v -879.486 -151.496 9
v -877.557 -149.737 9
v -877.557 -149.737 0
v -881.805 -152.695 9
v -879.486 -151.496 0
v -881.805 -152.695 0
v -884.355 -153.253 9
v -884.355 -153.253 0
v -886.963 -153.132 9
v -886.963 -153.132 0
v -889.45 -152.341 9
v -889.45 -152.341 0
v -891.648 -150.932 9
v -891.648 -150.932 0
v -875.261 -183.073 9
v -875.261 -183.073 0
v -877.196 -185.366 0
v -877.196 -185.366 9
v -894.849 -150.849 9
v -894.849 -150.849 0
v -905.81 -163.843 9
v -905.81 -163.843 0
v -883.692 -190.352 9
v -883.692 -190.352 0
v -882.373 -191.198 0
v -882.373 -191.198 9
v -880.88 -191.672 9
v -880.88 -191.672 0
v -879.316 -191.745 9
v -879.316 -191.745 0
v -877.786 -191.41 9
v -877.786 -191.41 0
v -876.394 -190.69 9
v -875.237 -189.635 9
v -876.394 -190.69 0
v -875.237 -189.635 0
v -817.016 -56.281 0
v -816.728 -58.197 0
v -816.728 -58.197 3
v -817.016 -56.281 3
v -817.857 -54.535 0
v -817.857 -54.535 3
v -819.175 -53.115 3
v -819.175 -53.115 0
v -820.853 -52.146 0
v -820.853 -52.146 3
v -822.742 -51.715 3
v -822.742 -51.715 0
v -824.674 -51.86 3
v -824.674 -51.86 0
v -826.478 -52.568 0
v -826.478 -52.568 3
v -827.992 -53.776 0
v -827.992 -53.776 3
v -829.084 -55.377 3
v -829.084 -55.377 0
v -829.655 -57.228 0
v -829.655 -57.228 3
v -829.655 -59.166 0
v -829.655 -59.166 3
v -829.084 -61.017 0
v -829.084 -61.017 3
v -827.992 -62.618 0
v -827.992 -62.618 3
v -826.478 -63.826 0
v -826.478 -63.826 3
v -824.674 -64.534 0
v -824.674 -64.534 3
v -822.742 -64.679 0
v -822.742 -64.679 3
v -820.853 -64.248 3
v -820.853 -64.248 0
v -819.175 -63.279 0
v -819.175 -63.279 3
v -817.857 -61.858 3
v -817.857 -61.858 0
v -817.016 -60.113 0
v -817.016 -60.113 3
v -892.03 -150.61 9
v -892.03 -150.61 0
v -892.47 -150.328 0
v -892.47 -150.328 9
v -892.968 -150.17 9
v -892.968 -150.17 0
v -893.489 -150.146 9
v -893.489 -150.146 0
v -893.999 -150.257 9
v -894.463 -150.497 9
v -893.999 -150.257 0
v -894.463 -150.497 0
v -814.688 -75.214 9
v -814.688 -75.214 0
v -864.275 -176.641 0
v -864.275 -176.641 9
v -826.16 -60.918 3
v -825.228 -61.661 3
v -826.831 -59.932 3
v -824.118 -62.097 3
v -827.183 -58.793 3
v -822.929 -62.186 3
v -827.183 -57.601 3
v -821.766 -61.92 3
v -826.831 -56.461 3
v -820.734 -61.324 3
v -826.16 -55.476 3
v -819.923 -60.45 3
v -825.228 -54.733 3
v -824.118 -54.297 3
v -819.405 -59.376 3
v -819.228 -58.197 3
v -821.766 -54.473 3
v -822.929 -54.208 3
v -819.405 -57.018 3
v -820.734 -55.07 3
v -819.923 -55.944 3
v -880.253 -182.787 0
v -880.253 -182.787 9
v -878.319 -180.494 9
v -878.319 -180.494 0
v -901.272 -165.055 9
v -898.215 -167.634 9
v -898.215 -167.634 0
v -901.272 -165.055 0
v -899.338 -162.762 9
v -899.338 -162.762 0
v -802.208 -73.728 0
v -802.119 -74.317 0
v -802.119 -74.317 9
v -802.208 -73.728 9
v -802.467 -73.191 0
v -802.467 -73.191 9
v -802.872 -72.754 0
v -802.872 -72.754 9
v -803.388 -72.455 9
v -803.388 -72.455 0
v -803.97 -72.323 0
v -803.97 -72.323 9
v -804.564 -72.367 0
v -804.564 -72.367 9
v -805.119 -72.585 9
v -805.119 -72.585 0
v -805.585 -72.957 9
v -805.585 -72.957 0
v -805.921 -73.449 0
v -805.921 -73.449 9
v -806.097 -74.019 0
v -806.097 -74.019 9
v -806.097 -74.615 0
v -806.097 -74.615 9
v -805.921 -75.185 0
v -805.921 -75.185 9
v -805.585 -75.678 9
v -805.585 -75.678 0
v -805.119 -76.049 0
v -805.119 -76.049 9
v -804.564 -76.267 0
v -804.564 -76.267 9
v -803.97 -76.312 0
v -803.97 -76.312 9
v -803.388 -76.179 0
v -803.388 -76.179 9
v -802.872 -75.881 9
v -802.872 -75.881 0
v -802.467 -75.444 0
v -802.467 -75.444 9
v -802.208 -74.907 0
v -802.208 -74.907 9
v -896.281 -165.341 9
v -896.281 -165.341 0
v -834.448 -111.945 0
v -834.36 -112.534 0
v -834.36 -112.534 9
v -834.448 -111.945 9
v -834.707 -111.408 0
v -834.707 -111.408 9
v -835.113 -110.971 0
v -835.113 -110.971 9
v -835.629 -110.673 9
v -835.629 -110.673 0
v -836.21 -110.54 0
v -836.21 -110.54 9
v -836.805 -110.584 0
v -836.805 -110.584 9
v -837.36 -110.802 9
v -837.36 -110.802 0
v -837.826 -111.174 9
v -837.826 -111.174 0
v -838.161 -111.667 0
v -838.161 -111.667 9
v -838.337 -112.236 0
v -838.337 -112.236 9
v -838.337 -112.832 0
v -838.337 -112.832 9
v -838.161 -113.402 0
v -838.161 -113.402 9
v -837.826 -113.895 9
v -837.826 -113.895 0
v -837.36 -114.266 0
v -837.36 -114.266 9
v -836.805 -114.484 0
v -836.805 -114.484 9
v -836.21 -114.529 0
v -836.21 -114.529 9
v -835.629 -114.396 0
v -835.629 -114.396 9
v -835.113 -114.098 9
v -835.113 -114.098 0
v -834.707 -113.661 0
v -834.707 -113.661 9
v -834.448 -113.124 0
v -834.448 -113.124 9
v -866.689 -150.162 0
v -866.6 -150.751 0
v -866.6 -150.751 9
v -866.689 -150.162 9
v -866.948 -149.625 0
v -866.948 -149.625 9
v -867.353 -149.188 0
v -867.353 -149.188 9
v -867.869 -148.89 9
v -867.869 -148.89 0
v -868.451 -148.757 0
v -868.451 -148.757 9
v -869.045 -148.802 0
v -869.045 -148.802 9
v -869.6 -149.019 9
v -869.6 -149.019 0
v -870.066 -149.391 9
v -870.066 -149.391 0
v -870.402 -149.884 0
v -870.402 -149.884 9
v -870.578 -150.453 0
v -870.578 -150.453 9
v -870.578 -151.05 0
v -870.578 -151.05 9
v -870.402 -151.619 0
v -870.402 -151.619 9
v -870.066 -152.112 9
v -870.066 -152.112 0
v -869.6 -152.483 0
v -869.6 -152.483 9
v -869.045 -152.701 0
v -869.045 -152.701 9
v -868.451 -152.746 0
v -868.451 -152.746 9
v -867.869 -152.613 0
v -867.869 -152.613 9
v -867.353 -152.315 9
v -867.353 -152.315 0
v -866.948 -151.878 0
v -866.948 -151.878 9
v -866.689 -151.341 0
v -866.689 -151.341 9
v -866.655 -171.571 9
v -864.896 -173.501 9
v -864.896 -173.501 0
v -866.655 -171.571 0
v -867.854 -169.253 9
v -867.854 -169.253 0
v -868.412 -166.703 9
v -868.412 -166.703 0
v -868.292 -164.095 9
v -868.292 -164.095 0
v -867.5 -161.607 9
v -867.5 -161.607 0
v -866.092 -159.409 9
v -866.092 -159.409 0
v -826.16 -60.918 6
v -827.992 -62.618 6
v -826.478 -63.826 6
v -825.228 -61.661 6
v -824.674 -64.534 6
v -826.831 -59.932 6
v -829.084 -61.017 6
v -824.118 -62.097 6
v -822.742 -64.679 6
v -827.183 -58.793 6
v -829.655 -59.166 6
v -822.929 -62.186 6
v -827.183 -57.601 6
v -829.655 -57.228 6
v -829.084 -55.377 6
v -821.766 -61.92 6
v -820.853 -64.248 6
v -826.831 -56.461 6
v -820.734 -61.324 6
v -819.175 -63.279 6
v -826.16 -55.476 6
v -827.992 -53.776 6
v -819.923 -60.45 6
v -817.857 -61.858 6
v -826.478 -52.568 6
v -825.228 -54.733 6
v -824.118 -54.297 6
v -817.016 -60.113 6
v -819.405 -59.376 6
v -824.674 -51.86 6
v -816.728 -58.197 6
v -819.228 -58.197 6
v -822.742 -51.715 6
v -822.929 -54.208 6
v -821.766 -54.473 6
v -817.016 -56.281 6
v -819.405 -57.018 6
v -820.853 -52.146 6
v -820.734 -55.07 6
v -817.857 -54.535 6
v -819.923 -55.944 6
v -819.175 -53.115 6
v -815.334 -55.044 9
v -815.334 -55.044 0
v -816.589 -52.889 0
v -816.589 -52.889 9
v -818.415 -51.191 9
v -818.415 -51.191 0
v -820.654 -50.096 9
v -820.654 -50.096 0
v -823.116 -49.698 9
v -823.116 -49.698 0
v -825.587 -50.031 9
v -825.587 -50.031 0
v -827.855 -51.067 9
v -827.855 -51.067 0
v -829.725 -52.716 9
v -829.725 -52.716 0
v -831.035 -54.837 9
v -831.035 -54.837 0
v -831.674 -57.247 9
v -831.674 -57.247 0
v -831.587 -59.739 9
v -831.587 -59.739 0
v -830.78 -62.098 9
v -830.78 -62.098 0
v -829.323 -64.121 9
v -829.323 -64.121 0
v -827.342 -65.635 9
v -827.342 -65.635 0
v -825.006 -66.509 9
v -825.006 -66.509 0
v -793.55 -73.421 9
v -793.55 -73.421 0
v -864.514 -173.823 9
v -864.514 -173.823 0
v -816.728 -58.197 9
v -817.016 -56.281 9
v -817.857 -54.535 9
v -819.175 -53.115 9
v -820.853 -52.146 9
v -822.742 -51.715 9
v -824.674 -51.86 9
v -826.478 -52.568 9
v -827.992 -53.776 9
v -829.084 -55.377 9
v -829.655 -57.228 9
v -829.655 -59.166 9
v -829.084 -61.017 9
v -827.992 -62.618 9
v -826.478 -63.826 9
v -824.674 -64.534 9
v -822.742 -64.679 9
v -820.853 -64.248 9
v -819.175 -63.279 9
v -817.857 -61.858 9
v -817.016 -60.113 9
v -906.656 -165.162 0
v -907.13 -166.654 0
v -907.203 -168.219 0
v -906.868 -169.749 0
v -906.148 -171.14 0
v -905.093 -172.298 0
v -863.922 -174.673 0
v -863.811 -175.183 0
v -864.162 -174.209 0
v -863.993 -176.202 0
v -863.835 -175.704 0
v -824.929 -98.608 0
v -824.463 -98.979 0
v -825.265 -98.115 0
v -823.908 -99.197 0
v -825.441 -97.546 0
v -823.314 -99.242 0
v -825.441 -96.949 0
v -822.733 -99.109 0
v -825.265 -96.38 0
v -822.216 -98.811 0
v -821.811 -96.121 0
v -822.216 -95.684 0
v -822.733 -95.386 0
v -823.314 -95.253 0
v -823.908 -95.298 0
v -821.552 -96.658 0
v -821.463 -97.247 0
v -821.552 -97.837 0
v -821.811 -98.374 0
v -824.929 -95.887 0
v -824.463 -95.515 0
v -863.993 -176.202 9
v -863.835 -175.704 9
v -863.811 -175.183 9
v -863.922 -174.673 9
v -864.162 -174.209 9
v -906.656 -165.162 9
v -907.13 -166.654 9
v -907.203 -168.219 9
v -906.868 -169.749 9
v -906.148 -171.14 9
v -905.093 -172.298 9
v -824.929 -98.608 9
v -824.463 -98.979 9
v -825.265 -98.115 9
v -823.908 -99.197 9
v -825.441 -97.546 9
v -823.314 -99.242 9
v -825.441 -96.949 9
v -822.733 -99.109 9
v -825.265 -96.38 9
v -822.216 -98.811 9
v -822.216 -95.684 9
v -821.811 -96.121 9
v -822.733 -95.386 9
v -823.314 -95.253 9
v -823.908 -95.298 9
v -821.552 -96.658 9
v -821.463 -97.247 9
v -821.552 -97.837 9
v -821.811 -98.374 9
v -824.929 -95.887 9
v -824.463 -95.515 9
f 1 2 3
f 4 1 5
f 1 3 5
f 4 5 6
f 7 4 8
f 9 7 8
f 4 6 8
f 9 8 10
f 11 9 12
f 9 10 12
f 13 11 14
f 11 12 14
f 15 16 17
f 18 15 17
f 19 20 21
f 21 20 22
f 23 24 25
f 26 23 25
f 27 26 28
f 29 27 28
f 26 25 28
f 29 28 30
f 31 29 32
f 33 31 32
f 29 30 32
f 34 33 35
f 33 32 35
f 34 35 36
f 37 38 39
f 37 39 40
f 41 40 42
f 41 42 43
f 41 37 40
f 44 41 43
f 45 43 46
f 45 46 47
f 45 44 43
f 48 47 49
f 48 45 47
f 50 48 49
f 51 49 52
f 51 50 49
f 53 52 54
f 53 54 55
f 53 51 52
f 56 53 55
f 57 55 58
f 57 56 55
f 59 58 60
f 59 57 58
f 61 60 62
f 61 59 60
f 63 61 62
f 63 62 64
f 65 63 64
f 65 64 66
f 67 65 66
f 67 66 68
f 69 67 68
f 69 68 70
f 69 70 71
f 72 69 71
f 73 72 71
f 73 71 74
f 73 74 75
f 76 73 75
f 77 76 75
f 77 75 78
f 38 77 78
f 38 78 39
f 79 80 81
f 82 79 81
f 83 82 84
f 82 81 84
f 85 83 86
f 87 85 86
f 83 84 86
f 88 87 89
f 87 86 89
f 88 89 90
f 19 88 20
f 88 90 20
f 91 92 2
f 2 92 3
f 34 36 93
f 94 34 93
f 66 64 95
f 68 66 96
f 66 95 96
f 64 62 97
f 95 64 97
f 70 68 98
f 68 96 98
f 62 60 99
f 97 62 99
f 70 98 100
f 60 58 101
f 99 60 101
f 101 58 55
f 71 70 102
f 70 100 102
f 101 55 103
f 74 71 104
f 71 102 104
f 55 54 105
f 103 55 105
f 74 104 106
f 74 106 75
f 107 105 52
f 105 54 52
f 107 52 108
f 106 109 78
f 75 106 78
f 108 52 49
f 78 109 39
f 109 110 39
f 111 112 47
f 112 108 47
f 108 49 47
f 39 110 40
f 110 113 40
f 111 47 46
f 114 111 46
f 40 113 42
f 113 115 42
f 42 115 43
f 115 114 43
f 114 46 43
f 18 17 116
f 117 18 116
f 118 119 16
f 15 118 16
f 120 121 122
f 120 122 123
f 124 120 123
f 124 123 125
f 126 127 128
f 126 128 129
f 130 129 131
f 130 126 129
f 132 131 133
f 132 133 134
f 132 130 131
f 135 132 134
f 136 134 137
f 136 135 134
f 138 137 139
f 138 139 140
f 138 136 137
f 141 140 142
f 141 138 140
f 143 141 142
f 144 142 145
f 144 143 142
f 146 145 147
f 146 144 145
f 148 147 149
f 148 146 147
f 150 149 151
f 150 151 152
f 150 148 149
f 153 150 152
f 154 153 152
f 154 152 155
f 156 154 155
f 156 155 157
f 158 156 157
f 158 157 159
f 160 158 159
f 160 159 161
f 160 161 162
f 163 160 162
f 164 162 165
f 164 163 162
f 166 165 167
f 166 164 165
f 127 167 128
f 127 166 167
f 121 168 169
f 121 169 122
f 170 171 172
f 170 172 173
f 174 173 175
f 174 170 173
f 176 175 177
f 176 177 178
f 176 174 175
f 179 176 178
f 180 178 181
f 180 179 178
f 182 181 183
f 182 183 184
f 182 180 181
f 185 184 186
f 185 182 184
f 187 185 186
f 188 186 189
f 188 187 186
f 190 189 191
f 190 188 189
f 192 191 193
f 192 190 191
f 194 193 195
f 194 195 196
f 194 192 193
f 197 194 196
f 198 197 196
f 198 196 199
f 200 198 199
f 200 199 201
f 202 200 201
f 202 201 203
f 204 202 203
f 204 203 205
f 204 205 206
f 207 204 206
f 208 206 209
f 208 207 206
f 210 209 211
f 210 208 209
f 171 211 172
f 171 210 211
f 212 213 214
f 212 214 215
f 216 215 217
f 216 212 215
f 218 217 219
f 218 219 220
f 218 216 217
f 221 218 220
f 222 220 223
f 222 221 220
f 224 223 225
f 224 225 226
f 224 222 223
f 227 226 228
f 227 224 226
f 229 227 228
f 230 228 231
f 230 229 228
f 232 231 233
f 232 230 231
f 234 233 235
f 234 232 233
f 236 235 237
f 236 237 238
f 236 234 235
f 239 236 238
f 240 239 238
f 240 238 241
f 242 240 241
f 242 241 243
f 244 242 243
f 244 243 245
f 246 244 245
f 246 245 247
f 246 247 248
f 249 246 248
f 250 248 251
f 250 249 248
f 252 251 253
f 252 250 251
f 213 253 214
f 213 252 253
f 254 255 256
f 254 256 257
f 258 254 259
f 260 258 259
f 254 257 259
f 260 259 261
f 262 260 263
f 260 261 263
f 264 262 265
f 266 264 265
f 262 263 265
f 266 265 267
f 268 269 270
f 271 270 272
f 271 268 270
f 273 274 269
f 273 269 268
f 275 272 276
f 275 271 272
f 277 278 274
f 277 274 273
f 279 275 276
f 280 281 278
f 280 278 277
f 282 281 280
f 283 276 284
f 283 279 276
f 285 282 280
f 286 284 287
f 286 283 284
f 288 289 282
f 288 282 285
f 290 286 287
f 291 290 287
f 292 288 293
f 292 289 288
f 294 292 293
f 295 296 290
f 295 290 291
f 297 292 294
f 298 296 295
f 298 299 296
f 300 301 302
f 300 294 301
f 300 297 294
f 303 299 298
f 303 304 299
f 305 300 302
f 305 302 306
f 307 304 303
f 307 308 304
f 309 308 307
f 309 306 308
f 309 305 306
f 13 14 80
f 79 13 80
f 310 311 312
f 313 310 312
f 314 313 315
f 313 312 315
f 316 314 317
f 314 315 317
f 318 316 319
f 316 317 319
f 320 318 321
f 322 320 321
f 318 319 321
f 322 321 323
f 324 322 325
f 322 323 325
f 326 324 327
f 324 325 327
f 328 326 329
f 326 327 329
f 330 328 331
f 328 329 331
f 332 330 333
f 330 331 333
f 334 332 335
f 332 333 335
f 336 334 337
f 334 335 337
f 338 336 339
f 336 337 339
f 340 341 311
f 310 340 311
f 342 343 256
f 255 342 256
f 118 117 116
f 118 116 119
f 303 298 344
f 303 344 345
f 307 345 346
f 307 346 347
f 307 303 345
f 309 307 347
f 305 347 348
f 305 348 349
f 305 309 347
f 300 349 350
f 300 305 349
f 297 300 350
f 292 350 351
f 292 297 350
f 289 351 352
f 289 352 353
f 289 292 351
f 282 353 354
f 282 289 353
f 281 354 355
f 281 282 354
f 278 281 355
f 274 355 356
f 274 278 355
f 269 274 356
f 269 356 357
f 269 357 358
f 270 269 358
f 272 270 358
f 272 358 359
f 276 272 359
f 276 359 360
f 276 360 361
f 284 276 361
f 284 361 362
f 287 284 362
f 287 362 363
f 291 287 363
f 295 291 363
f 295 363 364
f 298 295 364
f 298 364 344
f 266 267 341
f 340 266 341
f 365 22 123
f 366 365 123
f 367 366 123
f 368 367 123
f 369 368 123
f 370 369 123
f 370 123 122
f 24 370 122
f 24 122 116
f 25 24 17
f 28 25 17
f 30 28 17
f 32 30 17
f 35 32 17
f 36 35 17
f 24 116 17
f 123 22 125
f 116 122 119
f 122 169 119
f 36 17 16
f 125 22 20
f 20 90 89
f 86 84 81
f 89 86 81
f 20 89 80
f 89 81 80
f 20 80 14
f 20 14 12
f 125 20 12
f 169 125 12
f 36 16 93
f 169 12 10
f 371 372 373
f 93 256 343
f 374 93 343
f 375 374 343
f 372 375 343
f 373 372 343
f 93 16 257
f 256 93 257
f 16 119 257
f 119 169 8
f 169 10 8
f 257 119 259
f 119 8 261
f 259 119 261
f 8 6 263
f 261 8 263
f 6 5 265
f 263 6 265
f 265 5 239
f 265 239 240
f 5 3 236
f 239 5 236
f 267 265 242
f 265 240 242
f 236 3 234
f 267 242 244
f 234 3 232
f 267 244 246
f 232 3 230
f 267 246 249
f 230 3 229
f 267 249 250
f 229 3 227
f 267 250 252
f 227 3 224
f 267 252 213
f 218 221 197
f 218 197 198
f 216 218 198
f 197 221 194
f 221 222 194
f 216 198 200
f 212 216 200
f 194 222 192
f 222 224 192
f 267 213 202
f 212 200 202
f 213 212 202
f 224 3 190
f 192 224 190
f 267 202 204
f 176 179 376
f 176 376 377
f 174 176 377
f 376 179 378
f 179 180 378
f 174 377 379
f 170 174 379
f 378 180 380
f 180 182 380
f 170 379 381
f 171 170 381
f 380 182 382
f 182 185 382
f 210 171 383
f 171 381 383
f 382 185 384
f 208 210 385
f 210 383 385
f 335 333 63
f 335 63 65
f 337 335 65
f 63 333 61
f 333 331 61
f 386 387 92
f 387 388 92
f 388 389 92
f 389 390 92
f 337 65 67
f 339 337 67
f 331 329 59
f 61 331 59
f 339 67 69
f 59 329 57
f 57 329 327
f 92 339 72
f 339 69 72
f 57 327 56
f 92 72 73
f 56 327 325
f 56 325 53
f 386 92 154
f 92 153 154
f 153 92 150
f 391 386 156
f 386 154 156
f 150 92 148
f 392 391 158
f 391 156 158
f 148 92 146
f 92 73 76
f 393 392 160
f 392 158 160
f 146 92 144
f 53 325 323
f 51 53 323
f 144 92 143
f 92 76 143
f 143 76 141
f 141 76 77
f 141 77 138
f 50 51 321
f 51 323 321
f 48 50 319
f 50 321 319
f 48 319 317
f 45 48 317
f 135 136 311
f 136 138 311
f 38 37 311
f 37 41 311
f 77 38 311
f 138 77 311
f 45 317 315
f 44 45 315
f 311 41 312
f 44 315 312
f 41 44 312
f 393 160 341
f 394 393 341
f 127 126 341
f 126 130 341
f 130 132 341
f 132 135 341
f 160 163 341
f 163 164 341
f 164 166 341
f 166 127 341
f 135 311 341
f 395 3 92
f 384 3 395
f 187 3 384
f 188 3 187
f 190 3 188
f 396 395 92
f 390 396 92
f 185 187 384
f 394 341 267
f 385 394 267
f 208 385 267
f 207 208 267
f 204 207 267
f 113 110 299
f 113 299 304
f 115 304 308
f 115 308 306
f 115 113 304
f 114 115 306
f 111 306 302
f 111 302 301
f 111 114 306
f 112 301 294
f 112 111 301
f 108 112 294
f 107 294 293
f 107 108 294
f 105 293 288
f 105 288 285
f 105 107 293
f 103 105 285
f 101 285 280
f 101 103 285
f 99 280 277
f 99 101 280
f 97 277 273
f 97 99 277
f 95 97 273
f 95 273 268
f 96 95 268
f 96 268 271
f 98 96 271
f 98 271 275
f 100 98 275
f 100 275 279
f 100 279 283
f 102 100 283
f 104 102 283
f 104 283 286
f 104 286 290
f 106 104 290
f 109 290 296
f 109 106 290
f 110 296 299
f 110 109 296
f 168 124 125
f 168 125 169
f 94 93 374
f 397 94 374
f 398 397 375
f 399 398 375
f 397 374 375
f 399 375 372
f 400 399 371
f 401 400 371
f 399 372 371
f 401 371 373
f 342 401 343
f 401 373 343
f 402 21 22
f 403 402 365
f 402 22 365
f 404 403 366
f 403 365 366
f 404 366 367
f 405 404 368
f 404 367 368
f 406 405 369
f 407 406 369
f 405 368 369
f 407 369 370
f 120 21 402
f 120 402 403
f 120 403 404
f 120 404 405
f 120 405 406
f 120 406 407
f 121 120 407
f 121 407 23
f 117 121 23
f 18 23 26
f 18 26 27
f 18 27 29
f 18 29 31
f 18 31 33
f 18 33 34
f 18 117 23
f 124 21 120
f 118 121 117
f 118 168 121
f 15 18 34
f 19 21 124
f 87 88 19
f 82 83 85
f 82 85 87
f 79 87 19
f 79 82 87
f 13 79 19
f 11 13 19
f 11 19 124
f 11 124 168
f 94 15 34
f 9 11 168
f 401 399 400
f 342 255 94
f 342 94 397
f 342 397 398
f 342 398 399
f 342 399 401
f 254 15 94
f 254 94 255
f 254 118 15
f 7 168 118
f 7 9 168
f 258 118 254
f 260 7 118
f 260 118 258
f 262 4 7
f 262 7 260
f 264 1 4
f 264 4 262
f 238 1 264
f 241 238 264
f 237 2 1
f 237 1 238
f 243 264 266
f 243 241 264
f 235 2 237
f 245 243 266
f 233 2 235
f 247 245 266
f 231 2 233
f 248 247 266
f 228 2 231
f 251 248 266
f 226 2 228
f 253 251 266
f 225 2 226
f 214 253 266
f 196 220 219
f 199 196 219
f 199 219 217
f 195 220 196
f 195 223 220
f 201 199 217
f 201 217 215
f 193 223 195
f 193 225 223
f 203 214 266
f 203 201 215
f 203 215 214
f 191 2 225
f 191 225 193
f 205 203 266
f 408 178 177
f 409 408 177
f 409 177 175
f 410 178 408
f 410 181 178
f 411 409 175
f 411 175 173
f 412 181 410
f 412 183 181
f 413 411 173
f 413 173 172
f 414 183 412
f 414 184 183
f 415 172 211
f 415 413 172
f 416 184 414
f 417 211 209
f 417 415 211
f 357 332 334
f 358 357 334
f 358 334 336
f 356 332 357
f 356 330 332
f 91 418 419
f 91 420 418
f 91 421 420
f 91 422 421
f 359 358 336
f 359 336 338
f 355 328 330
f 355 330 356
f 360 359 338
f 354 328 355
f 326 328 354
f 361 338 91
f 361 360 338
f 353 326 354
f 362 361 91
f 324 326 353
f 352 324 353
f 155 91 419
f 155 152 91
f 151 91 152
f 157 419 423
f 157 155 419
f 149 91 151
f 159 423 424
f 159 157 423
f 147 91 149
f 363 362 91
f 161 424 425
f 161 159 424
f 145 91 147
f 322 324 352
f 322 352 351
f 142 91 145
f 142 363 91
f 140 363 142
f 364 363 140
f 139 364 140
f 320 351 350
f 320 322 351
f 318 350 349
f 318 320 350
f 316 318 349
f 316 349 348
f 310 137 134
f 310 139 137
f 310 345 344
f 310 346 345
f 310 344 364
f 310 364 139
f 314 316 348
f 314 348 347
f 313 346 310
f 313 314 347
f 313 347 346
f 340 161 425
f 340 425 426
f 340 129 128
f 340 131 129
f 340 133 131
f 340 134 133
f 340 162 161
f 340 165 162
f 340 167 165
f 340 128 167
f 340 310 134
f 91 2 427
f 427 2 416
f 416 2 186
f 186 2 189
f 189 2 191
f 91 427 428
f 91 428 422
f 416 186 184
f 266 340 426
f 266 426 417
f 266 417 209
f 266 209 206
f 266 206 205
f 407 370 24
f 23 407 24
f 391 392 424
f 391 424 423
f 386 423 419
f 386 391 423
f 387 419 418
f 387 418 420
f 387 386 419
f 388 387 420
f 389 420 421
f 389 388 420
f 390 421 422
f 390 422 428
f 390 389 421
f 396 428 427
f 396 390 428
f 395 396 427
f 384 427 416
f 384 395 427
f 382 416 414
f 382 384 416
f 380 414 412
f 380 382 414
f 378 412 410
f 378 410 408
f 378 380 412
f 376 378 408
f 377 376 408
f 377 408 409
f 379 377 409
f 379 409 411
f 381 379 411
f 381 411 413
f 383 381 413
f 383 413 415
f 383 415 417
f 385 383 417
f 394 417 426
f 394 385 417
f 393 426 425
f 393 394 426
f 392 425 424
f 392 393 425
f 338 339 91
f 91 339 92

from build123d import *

# Parameters (mm, degrees)
SKETCH2_R           = 2
SKETCH2_R_2         = 6.5
BOSS_EXTRUDE2_DEPTH = 9
BOSS_EXTRUDE5_START = 3
SKETCH2_7_R         = 6.5
SKETCH2_7_R_2       = 4
BOSS_EXTRUDE5_DEPTH = 3


with BuildPart() as part:
    # Sketch2 → Boss-Extrude2 (new body)
    with BuildSketch(Plane.XY):
        with BuildLine():
            Line((-793.550395835, -73.420672293), (-815.334160836, -55.043578334))
            ThreePointArc((-815.334160836, -55.043578334), (-829.724521088, -52.716019141), (-825.006315551, -66.508717808))
            Line((-825.006315551, -66.508717808), (-814.687690024, -75.213657052))
            Line((-814.687690024, -75.213657052), (-877.556695674, -149.737063634))
            ThreePointArc((-877.556695674, -149.737063634), (-884.354900869, -153.253176529), (-891.648225133, -150.932386807))
            Line((-891.648225133, -150.932386807), (-892.030396449, -150.609981649))
            ThreePointArc((-892.030396449, -150.609981649), (-893.489061302, -150.145823705), (-894.848702341, -150.849046284))
            Line((-894.848702341, -150.849046284), (-905.810477685, -163.842871021))
            ThreePointArc((-905.810477685, -163.842871021), (-907.202951518, -168.21886558), (-905.093283782, -172.297788697))
            Line((-905.093283782, -172.297788697), (-883.691690097, -190.352477499))
            ThreePointArc((-883.691690097, -190.352477499), (-879.315695538, -191.744951332), (-875.236772421, -189.635283596))
            Line((-875.236772421, -189.635283596), (-864.274997077, -176.641458858))
            ThreePointArc((-864.274997077, -176.641458858), (-863.810839132, -175.182794005), (-864.514061711, -173.823152966))
            Line((-864.514061711, -173.823152966), (-864.896233027, -173.500747809))
            ThreePointArc((-864.896233027, -173.500747809), (-868.412345922, -166.702542614), (-866.0915562, -159.409218349))
            Line((-866.0915562, -159.409218349), (-793.550395835, -73.420672293))
        make_face()
        Polygon((-898.215030346, -167.633870852), (-901.272400872, -165.054629594), (-899.337969929, -162.761601699), (-896.280599403, -165.340842957), align=None, mode=Mode.SUBTRACT)
        Polygon((-877.195607976, -185.366154496), (-880.252978503, -182.786913239), (-878.31854756, -180.493885344), (-875.261177033, -183.073126602), align=None, mode=Mode.SUBTRACT)
        with Locations((-868.600074365, -150.751427834)):
            Circle(SKETCH2_R, mode=Mode.SUBTRACT)
        with Locations((-836.359558647, -112.534296253)):
            Circle(SKETCH2_R, mode=Mode.SUBTRACT)
        with Locations((-823.46335236, -97.247443621)):
            Circle(SKETCH2_R, mode=Mode.SUBTRACT)
        with Locations((-804.119042929, -74.317164672)):
            Circle(SKETCH2_R, mode=Mode.SUBTRACT)
        with Locations((-823.22760872, -58.196906813)):
            Circle(SKETCH2_R_2, mode=Mode.SUBTRACT)
    extrude(amount=BOSS_EXTRUDE2_DEPTH)

    # Sketch2<7> → Boss-Extrude5 (add)
    with BuildSketch(Plane.XY.offset(BOSS_EXTRUDE5_START)):
        with Locations((-823.22760872, -58.196906813)):
            Circle(SKETCH2_7_R)
        with Locations((-823.22760872, -58.196906813)):
            Circle(SKETCH2_7_R_2, mode=Mode.SUBTRACT)
    extrude(amount=BOSS_EXTRUDE5_DEPTH)


solid = part.part
